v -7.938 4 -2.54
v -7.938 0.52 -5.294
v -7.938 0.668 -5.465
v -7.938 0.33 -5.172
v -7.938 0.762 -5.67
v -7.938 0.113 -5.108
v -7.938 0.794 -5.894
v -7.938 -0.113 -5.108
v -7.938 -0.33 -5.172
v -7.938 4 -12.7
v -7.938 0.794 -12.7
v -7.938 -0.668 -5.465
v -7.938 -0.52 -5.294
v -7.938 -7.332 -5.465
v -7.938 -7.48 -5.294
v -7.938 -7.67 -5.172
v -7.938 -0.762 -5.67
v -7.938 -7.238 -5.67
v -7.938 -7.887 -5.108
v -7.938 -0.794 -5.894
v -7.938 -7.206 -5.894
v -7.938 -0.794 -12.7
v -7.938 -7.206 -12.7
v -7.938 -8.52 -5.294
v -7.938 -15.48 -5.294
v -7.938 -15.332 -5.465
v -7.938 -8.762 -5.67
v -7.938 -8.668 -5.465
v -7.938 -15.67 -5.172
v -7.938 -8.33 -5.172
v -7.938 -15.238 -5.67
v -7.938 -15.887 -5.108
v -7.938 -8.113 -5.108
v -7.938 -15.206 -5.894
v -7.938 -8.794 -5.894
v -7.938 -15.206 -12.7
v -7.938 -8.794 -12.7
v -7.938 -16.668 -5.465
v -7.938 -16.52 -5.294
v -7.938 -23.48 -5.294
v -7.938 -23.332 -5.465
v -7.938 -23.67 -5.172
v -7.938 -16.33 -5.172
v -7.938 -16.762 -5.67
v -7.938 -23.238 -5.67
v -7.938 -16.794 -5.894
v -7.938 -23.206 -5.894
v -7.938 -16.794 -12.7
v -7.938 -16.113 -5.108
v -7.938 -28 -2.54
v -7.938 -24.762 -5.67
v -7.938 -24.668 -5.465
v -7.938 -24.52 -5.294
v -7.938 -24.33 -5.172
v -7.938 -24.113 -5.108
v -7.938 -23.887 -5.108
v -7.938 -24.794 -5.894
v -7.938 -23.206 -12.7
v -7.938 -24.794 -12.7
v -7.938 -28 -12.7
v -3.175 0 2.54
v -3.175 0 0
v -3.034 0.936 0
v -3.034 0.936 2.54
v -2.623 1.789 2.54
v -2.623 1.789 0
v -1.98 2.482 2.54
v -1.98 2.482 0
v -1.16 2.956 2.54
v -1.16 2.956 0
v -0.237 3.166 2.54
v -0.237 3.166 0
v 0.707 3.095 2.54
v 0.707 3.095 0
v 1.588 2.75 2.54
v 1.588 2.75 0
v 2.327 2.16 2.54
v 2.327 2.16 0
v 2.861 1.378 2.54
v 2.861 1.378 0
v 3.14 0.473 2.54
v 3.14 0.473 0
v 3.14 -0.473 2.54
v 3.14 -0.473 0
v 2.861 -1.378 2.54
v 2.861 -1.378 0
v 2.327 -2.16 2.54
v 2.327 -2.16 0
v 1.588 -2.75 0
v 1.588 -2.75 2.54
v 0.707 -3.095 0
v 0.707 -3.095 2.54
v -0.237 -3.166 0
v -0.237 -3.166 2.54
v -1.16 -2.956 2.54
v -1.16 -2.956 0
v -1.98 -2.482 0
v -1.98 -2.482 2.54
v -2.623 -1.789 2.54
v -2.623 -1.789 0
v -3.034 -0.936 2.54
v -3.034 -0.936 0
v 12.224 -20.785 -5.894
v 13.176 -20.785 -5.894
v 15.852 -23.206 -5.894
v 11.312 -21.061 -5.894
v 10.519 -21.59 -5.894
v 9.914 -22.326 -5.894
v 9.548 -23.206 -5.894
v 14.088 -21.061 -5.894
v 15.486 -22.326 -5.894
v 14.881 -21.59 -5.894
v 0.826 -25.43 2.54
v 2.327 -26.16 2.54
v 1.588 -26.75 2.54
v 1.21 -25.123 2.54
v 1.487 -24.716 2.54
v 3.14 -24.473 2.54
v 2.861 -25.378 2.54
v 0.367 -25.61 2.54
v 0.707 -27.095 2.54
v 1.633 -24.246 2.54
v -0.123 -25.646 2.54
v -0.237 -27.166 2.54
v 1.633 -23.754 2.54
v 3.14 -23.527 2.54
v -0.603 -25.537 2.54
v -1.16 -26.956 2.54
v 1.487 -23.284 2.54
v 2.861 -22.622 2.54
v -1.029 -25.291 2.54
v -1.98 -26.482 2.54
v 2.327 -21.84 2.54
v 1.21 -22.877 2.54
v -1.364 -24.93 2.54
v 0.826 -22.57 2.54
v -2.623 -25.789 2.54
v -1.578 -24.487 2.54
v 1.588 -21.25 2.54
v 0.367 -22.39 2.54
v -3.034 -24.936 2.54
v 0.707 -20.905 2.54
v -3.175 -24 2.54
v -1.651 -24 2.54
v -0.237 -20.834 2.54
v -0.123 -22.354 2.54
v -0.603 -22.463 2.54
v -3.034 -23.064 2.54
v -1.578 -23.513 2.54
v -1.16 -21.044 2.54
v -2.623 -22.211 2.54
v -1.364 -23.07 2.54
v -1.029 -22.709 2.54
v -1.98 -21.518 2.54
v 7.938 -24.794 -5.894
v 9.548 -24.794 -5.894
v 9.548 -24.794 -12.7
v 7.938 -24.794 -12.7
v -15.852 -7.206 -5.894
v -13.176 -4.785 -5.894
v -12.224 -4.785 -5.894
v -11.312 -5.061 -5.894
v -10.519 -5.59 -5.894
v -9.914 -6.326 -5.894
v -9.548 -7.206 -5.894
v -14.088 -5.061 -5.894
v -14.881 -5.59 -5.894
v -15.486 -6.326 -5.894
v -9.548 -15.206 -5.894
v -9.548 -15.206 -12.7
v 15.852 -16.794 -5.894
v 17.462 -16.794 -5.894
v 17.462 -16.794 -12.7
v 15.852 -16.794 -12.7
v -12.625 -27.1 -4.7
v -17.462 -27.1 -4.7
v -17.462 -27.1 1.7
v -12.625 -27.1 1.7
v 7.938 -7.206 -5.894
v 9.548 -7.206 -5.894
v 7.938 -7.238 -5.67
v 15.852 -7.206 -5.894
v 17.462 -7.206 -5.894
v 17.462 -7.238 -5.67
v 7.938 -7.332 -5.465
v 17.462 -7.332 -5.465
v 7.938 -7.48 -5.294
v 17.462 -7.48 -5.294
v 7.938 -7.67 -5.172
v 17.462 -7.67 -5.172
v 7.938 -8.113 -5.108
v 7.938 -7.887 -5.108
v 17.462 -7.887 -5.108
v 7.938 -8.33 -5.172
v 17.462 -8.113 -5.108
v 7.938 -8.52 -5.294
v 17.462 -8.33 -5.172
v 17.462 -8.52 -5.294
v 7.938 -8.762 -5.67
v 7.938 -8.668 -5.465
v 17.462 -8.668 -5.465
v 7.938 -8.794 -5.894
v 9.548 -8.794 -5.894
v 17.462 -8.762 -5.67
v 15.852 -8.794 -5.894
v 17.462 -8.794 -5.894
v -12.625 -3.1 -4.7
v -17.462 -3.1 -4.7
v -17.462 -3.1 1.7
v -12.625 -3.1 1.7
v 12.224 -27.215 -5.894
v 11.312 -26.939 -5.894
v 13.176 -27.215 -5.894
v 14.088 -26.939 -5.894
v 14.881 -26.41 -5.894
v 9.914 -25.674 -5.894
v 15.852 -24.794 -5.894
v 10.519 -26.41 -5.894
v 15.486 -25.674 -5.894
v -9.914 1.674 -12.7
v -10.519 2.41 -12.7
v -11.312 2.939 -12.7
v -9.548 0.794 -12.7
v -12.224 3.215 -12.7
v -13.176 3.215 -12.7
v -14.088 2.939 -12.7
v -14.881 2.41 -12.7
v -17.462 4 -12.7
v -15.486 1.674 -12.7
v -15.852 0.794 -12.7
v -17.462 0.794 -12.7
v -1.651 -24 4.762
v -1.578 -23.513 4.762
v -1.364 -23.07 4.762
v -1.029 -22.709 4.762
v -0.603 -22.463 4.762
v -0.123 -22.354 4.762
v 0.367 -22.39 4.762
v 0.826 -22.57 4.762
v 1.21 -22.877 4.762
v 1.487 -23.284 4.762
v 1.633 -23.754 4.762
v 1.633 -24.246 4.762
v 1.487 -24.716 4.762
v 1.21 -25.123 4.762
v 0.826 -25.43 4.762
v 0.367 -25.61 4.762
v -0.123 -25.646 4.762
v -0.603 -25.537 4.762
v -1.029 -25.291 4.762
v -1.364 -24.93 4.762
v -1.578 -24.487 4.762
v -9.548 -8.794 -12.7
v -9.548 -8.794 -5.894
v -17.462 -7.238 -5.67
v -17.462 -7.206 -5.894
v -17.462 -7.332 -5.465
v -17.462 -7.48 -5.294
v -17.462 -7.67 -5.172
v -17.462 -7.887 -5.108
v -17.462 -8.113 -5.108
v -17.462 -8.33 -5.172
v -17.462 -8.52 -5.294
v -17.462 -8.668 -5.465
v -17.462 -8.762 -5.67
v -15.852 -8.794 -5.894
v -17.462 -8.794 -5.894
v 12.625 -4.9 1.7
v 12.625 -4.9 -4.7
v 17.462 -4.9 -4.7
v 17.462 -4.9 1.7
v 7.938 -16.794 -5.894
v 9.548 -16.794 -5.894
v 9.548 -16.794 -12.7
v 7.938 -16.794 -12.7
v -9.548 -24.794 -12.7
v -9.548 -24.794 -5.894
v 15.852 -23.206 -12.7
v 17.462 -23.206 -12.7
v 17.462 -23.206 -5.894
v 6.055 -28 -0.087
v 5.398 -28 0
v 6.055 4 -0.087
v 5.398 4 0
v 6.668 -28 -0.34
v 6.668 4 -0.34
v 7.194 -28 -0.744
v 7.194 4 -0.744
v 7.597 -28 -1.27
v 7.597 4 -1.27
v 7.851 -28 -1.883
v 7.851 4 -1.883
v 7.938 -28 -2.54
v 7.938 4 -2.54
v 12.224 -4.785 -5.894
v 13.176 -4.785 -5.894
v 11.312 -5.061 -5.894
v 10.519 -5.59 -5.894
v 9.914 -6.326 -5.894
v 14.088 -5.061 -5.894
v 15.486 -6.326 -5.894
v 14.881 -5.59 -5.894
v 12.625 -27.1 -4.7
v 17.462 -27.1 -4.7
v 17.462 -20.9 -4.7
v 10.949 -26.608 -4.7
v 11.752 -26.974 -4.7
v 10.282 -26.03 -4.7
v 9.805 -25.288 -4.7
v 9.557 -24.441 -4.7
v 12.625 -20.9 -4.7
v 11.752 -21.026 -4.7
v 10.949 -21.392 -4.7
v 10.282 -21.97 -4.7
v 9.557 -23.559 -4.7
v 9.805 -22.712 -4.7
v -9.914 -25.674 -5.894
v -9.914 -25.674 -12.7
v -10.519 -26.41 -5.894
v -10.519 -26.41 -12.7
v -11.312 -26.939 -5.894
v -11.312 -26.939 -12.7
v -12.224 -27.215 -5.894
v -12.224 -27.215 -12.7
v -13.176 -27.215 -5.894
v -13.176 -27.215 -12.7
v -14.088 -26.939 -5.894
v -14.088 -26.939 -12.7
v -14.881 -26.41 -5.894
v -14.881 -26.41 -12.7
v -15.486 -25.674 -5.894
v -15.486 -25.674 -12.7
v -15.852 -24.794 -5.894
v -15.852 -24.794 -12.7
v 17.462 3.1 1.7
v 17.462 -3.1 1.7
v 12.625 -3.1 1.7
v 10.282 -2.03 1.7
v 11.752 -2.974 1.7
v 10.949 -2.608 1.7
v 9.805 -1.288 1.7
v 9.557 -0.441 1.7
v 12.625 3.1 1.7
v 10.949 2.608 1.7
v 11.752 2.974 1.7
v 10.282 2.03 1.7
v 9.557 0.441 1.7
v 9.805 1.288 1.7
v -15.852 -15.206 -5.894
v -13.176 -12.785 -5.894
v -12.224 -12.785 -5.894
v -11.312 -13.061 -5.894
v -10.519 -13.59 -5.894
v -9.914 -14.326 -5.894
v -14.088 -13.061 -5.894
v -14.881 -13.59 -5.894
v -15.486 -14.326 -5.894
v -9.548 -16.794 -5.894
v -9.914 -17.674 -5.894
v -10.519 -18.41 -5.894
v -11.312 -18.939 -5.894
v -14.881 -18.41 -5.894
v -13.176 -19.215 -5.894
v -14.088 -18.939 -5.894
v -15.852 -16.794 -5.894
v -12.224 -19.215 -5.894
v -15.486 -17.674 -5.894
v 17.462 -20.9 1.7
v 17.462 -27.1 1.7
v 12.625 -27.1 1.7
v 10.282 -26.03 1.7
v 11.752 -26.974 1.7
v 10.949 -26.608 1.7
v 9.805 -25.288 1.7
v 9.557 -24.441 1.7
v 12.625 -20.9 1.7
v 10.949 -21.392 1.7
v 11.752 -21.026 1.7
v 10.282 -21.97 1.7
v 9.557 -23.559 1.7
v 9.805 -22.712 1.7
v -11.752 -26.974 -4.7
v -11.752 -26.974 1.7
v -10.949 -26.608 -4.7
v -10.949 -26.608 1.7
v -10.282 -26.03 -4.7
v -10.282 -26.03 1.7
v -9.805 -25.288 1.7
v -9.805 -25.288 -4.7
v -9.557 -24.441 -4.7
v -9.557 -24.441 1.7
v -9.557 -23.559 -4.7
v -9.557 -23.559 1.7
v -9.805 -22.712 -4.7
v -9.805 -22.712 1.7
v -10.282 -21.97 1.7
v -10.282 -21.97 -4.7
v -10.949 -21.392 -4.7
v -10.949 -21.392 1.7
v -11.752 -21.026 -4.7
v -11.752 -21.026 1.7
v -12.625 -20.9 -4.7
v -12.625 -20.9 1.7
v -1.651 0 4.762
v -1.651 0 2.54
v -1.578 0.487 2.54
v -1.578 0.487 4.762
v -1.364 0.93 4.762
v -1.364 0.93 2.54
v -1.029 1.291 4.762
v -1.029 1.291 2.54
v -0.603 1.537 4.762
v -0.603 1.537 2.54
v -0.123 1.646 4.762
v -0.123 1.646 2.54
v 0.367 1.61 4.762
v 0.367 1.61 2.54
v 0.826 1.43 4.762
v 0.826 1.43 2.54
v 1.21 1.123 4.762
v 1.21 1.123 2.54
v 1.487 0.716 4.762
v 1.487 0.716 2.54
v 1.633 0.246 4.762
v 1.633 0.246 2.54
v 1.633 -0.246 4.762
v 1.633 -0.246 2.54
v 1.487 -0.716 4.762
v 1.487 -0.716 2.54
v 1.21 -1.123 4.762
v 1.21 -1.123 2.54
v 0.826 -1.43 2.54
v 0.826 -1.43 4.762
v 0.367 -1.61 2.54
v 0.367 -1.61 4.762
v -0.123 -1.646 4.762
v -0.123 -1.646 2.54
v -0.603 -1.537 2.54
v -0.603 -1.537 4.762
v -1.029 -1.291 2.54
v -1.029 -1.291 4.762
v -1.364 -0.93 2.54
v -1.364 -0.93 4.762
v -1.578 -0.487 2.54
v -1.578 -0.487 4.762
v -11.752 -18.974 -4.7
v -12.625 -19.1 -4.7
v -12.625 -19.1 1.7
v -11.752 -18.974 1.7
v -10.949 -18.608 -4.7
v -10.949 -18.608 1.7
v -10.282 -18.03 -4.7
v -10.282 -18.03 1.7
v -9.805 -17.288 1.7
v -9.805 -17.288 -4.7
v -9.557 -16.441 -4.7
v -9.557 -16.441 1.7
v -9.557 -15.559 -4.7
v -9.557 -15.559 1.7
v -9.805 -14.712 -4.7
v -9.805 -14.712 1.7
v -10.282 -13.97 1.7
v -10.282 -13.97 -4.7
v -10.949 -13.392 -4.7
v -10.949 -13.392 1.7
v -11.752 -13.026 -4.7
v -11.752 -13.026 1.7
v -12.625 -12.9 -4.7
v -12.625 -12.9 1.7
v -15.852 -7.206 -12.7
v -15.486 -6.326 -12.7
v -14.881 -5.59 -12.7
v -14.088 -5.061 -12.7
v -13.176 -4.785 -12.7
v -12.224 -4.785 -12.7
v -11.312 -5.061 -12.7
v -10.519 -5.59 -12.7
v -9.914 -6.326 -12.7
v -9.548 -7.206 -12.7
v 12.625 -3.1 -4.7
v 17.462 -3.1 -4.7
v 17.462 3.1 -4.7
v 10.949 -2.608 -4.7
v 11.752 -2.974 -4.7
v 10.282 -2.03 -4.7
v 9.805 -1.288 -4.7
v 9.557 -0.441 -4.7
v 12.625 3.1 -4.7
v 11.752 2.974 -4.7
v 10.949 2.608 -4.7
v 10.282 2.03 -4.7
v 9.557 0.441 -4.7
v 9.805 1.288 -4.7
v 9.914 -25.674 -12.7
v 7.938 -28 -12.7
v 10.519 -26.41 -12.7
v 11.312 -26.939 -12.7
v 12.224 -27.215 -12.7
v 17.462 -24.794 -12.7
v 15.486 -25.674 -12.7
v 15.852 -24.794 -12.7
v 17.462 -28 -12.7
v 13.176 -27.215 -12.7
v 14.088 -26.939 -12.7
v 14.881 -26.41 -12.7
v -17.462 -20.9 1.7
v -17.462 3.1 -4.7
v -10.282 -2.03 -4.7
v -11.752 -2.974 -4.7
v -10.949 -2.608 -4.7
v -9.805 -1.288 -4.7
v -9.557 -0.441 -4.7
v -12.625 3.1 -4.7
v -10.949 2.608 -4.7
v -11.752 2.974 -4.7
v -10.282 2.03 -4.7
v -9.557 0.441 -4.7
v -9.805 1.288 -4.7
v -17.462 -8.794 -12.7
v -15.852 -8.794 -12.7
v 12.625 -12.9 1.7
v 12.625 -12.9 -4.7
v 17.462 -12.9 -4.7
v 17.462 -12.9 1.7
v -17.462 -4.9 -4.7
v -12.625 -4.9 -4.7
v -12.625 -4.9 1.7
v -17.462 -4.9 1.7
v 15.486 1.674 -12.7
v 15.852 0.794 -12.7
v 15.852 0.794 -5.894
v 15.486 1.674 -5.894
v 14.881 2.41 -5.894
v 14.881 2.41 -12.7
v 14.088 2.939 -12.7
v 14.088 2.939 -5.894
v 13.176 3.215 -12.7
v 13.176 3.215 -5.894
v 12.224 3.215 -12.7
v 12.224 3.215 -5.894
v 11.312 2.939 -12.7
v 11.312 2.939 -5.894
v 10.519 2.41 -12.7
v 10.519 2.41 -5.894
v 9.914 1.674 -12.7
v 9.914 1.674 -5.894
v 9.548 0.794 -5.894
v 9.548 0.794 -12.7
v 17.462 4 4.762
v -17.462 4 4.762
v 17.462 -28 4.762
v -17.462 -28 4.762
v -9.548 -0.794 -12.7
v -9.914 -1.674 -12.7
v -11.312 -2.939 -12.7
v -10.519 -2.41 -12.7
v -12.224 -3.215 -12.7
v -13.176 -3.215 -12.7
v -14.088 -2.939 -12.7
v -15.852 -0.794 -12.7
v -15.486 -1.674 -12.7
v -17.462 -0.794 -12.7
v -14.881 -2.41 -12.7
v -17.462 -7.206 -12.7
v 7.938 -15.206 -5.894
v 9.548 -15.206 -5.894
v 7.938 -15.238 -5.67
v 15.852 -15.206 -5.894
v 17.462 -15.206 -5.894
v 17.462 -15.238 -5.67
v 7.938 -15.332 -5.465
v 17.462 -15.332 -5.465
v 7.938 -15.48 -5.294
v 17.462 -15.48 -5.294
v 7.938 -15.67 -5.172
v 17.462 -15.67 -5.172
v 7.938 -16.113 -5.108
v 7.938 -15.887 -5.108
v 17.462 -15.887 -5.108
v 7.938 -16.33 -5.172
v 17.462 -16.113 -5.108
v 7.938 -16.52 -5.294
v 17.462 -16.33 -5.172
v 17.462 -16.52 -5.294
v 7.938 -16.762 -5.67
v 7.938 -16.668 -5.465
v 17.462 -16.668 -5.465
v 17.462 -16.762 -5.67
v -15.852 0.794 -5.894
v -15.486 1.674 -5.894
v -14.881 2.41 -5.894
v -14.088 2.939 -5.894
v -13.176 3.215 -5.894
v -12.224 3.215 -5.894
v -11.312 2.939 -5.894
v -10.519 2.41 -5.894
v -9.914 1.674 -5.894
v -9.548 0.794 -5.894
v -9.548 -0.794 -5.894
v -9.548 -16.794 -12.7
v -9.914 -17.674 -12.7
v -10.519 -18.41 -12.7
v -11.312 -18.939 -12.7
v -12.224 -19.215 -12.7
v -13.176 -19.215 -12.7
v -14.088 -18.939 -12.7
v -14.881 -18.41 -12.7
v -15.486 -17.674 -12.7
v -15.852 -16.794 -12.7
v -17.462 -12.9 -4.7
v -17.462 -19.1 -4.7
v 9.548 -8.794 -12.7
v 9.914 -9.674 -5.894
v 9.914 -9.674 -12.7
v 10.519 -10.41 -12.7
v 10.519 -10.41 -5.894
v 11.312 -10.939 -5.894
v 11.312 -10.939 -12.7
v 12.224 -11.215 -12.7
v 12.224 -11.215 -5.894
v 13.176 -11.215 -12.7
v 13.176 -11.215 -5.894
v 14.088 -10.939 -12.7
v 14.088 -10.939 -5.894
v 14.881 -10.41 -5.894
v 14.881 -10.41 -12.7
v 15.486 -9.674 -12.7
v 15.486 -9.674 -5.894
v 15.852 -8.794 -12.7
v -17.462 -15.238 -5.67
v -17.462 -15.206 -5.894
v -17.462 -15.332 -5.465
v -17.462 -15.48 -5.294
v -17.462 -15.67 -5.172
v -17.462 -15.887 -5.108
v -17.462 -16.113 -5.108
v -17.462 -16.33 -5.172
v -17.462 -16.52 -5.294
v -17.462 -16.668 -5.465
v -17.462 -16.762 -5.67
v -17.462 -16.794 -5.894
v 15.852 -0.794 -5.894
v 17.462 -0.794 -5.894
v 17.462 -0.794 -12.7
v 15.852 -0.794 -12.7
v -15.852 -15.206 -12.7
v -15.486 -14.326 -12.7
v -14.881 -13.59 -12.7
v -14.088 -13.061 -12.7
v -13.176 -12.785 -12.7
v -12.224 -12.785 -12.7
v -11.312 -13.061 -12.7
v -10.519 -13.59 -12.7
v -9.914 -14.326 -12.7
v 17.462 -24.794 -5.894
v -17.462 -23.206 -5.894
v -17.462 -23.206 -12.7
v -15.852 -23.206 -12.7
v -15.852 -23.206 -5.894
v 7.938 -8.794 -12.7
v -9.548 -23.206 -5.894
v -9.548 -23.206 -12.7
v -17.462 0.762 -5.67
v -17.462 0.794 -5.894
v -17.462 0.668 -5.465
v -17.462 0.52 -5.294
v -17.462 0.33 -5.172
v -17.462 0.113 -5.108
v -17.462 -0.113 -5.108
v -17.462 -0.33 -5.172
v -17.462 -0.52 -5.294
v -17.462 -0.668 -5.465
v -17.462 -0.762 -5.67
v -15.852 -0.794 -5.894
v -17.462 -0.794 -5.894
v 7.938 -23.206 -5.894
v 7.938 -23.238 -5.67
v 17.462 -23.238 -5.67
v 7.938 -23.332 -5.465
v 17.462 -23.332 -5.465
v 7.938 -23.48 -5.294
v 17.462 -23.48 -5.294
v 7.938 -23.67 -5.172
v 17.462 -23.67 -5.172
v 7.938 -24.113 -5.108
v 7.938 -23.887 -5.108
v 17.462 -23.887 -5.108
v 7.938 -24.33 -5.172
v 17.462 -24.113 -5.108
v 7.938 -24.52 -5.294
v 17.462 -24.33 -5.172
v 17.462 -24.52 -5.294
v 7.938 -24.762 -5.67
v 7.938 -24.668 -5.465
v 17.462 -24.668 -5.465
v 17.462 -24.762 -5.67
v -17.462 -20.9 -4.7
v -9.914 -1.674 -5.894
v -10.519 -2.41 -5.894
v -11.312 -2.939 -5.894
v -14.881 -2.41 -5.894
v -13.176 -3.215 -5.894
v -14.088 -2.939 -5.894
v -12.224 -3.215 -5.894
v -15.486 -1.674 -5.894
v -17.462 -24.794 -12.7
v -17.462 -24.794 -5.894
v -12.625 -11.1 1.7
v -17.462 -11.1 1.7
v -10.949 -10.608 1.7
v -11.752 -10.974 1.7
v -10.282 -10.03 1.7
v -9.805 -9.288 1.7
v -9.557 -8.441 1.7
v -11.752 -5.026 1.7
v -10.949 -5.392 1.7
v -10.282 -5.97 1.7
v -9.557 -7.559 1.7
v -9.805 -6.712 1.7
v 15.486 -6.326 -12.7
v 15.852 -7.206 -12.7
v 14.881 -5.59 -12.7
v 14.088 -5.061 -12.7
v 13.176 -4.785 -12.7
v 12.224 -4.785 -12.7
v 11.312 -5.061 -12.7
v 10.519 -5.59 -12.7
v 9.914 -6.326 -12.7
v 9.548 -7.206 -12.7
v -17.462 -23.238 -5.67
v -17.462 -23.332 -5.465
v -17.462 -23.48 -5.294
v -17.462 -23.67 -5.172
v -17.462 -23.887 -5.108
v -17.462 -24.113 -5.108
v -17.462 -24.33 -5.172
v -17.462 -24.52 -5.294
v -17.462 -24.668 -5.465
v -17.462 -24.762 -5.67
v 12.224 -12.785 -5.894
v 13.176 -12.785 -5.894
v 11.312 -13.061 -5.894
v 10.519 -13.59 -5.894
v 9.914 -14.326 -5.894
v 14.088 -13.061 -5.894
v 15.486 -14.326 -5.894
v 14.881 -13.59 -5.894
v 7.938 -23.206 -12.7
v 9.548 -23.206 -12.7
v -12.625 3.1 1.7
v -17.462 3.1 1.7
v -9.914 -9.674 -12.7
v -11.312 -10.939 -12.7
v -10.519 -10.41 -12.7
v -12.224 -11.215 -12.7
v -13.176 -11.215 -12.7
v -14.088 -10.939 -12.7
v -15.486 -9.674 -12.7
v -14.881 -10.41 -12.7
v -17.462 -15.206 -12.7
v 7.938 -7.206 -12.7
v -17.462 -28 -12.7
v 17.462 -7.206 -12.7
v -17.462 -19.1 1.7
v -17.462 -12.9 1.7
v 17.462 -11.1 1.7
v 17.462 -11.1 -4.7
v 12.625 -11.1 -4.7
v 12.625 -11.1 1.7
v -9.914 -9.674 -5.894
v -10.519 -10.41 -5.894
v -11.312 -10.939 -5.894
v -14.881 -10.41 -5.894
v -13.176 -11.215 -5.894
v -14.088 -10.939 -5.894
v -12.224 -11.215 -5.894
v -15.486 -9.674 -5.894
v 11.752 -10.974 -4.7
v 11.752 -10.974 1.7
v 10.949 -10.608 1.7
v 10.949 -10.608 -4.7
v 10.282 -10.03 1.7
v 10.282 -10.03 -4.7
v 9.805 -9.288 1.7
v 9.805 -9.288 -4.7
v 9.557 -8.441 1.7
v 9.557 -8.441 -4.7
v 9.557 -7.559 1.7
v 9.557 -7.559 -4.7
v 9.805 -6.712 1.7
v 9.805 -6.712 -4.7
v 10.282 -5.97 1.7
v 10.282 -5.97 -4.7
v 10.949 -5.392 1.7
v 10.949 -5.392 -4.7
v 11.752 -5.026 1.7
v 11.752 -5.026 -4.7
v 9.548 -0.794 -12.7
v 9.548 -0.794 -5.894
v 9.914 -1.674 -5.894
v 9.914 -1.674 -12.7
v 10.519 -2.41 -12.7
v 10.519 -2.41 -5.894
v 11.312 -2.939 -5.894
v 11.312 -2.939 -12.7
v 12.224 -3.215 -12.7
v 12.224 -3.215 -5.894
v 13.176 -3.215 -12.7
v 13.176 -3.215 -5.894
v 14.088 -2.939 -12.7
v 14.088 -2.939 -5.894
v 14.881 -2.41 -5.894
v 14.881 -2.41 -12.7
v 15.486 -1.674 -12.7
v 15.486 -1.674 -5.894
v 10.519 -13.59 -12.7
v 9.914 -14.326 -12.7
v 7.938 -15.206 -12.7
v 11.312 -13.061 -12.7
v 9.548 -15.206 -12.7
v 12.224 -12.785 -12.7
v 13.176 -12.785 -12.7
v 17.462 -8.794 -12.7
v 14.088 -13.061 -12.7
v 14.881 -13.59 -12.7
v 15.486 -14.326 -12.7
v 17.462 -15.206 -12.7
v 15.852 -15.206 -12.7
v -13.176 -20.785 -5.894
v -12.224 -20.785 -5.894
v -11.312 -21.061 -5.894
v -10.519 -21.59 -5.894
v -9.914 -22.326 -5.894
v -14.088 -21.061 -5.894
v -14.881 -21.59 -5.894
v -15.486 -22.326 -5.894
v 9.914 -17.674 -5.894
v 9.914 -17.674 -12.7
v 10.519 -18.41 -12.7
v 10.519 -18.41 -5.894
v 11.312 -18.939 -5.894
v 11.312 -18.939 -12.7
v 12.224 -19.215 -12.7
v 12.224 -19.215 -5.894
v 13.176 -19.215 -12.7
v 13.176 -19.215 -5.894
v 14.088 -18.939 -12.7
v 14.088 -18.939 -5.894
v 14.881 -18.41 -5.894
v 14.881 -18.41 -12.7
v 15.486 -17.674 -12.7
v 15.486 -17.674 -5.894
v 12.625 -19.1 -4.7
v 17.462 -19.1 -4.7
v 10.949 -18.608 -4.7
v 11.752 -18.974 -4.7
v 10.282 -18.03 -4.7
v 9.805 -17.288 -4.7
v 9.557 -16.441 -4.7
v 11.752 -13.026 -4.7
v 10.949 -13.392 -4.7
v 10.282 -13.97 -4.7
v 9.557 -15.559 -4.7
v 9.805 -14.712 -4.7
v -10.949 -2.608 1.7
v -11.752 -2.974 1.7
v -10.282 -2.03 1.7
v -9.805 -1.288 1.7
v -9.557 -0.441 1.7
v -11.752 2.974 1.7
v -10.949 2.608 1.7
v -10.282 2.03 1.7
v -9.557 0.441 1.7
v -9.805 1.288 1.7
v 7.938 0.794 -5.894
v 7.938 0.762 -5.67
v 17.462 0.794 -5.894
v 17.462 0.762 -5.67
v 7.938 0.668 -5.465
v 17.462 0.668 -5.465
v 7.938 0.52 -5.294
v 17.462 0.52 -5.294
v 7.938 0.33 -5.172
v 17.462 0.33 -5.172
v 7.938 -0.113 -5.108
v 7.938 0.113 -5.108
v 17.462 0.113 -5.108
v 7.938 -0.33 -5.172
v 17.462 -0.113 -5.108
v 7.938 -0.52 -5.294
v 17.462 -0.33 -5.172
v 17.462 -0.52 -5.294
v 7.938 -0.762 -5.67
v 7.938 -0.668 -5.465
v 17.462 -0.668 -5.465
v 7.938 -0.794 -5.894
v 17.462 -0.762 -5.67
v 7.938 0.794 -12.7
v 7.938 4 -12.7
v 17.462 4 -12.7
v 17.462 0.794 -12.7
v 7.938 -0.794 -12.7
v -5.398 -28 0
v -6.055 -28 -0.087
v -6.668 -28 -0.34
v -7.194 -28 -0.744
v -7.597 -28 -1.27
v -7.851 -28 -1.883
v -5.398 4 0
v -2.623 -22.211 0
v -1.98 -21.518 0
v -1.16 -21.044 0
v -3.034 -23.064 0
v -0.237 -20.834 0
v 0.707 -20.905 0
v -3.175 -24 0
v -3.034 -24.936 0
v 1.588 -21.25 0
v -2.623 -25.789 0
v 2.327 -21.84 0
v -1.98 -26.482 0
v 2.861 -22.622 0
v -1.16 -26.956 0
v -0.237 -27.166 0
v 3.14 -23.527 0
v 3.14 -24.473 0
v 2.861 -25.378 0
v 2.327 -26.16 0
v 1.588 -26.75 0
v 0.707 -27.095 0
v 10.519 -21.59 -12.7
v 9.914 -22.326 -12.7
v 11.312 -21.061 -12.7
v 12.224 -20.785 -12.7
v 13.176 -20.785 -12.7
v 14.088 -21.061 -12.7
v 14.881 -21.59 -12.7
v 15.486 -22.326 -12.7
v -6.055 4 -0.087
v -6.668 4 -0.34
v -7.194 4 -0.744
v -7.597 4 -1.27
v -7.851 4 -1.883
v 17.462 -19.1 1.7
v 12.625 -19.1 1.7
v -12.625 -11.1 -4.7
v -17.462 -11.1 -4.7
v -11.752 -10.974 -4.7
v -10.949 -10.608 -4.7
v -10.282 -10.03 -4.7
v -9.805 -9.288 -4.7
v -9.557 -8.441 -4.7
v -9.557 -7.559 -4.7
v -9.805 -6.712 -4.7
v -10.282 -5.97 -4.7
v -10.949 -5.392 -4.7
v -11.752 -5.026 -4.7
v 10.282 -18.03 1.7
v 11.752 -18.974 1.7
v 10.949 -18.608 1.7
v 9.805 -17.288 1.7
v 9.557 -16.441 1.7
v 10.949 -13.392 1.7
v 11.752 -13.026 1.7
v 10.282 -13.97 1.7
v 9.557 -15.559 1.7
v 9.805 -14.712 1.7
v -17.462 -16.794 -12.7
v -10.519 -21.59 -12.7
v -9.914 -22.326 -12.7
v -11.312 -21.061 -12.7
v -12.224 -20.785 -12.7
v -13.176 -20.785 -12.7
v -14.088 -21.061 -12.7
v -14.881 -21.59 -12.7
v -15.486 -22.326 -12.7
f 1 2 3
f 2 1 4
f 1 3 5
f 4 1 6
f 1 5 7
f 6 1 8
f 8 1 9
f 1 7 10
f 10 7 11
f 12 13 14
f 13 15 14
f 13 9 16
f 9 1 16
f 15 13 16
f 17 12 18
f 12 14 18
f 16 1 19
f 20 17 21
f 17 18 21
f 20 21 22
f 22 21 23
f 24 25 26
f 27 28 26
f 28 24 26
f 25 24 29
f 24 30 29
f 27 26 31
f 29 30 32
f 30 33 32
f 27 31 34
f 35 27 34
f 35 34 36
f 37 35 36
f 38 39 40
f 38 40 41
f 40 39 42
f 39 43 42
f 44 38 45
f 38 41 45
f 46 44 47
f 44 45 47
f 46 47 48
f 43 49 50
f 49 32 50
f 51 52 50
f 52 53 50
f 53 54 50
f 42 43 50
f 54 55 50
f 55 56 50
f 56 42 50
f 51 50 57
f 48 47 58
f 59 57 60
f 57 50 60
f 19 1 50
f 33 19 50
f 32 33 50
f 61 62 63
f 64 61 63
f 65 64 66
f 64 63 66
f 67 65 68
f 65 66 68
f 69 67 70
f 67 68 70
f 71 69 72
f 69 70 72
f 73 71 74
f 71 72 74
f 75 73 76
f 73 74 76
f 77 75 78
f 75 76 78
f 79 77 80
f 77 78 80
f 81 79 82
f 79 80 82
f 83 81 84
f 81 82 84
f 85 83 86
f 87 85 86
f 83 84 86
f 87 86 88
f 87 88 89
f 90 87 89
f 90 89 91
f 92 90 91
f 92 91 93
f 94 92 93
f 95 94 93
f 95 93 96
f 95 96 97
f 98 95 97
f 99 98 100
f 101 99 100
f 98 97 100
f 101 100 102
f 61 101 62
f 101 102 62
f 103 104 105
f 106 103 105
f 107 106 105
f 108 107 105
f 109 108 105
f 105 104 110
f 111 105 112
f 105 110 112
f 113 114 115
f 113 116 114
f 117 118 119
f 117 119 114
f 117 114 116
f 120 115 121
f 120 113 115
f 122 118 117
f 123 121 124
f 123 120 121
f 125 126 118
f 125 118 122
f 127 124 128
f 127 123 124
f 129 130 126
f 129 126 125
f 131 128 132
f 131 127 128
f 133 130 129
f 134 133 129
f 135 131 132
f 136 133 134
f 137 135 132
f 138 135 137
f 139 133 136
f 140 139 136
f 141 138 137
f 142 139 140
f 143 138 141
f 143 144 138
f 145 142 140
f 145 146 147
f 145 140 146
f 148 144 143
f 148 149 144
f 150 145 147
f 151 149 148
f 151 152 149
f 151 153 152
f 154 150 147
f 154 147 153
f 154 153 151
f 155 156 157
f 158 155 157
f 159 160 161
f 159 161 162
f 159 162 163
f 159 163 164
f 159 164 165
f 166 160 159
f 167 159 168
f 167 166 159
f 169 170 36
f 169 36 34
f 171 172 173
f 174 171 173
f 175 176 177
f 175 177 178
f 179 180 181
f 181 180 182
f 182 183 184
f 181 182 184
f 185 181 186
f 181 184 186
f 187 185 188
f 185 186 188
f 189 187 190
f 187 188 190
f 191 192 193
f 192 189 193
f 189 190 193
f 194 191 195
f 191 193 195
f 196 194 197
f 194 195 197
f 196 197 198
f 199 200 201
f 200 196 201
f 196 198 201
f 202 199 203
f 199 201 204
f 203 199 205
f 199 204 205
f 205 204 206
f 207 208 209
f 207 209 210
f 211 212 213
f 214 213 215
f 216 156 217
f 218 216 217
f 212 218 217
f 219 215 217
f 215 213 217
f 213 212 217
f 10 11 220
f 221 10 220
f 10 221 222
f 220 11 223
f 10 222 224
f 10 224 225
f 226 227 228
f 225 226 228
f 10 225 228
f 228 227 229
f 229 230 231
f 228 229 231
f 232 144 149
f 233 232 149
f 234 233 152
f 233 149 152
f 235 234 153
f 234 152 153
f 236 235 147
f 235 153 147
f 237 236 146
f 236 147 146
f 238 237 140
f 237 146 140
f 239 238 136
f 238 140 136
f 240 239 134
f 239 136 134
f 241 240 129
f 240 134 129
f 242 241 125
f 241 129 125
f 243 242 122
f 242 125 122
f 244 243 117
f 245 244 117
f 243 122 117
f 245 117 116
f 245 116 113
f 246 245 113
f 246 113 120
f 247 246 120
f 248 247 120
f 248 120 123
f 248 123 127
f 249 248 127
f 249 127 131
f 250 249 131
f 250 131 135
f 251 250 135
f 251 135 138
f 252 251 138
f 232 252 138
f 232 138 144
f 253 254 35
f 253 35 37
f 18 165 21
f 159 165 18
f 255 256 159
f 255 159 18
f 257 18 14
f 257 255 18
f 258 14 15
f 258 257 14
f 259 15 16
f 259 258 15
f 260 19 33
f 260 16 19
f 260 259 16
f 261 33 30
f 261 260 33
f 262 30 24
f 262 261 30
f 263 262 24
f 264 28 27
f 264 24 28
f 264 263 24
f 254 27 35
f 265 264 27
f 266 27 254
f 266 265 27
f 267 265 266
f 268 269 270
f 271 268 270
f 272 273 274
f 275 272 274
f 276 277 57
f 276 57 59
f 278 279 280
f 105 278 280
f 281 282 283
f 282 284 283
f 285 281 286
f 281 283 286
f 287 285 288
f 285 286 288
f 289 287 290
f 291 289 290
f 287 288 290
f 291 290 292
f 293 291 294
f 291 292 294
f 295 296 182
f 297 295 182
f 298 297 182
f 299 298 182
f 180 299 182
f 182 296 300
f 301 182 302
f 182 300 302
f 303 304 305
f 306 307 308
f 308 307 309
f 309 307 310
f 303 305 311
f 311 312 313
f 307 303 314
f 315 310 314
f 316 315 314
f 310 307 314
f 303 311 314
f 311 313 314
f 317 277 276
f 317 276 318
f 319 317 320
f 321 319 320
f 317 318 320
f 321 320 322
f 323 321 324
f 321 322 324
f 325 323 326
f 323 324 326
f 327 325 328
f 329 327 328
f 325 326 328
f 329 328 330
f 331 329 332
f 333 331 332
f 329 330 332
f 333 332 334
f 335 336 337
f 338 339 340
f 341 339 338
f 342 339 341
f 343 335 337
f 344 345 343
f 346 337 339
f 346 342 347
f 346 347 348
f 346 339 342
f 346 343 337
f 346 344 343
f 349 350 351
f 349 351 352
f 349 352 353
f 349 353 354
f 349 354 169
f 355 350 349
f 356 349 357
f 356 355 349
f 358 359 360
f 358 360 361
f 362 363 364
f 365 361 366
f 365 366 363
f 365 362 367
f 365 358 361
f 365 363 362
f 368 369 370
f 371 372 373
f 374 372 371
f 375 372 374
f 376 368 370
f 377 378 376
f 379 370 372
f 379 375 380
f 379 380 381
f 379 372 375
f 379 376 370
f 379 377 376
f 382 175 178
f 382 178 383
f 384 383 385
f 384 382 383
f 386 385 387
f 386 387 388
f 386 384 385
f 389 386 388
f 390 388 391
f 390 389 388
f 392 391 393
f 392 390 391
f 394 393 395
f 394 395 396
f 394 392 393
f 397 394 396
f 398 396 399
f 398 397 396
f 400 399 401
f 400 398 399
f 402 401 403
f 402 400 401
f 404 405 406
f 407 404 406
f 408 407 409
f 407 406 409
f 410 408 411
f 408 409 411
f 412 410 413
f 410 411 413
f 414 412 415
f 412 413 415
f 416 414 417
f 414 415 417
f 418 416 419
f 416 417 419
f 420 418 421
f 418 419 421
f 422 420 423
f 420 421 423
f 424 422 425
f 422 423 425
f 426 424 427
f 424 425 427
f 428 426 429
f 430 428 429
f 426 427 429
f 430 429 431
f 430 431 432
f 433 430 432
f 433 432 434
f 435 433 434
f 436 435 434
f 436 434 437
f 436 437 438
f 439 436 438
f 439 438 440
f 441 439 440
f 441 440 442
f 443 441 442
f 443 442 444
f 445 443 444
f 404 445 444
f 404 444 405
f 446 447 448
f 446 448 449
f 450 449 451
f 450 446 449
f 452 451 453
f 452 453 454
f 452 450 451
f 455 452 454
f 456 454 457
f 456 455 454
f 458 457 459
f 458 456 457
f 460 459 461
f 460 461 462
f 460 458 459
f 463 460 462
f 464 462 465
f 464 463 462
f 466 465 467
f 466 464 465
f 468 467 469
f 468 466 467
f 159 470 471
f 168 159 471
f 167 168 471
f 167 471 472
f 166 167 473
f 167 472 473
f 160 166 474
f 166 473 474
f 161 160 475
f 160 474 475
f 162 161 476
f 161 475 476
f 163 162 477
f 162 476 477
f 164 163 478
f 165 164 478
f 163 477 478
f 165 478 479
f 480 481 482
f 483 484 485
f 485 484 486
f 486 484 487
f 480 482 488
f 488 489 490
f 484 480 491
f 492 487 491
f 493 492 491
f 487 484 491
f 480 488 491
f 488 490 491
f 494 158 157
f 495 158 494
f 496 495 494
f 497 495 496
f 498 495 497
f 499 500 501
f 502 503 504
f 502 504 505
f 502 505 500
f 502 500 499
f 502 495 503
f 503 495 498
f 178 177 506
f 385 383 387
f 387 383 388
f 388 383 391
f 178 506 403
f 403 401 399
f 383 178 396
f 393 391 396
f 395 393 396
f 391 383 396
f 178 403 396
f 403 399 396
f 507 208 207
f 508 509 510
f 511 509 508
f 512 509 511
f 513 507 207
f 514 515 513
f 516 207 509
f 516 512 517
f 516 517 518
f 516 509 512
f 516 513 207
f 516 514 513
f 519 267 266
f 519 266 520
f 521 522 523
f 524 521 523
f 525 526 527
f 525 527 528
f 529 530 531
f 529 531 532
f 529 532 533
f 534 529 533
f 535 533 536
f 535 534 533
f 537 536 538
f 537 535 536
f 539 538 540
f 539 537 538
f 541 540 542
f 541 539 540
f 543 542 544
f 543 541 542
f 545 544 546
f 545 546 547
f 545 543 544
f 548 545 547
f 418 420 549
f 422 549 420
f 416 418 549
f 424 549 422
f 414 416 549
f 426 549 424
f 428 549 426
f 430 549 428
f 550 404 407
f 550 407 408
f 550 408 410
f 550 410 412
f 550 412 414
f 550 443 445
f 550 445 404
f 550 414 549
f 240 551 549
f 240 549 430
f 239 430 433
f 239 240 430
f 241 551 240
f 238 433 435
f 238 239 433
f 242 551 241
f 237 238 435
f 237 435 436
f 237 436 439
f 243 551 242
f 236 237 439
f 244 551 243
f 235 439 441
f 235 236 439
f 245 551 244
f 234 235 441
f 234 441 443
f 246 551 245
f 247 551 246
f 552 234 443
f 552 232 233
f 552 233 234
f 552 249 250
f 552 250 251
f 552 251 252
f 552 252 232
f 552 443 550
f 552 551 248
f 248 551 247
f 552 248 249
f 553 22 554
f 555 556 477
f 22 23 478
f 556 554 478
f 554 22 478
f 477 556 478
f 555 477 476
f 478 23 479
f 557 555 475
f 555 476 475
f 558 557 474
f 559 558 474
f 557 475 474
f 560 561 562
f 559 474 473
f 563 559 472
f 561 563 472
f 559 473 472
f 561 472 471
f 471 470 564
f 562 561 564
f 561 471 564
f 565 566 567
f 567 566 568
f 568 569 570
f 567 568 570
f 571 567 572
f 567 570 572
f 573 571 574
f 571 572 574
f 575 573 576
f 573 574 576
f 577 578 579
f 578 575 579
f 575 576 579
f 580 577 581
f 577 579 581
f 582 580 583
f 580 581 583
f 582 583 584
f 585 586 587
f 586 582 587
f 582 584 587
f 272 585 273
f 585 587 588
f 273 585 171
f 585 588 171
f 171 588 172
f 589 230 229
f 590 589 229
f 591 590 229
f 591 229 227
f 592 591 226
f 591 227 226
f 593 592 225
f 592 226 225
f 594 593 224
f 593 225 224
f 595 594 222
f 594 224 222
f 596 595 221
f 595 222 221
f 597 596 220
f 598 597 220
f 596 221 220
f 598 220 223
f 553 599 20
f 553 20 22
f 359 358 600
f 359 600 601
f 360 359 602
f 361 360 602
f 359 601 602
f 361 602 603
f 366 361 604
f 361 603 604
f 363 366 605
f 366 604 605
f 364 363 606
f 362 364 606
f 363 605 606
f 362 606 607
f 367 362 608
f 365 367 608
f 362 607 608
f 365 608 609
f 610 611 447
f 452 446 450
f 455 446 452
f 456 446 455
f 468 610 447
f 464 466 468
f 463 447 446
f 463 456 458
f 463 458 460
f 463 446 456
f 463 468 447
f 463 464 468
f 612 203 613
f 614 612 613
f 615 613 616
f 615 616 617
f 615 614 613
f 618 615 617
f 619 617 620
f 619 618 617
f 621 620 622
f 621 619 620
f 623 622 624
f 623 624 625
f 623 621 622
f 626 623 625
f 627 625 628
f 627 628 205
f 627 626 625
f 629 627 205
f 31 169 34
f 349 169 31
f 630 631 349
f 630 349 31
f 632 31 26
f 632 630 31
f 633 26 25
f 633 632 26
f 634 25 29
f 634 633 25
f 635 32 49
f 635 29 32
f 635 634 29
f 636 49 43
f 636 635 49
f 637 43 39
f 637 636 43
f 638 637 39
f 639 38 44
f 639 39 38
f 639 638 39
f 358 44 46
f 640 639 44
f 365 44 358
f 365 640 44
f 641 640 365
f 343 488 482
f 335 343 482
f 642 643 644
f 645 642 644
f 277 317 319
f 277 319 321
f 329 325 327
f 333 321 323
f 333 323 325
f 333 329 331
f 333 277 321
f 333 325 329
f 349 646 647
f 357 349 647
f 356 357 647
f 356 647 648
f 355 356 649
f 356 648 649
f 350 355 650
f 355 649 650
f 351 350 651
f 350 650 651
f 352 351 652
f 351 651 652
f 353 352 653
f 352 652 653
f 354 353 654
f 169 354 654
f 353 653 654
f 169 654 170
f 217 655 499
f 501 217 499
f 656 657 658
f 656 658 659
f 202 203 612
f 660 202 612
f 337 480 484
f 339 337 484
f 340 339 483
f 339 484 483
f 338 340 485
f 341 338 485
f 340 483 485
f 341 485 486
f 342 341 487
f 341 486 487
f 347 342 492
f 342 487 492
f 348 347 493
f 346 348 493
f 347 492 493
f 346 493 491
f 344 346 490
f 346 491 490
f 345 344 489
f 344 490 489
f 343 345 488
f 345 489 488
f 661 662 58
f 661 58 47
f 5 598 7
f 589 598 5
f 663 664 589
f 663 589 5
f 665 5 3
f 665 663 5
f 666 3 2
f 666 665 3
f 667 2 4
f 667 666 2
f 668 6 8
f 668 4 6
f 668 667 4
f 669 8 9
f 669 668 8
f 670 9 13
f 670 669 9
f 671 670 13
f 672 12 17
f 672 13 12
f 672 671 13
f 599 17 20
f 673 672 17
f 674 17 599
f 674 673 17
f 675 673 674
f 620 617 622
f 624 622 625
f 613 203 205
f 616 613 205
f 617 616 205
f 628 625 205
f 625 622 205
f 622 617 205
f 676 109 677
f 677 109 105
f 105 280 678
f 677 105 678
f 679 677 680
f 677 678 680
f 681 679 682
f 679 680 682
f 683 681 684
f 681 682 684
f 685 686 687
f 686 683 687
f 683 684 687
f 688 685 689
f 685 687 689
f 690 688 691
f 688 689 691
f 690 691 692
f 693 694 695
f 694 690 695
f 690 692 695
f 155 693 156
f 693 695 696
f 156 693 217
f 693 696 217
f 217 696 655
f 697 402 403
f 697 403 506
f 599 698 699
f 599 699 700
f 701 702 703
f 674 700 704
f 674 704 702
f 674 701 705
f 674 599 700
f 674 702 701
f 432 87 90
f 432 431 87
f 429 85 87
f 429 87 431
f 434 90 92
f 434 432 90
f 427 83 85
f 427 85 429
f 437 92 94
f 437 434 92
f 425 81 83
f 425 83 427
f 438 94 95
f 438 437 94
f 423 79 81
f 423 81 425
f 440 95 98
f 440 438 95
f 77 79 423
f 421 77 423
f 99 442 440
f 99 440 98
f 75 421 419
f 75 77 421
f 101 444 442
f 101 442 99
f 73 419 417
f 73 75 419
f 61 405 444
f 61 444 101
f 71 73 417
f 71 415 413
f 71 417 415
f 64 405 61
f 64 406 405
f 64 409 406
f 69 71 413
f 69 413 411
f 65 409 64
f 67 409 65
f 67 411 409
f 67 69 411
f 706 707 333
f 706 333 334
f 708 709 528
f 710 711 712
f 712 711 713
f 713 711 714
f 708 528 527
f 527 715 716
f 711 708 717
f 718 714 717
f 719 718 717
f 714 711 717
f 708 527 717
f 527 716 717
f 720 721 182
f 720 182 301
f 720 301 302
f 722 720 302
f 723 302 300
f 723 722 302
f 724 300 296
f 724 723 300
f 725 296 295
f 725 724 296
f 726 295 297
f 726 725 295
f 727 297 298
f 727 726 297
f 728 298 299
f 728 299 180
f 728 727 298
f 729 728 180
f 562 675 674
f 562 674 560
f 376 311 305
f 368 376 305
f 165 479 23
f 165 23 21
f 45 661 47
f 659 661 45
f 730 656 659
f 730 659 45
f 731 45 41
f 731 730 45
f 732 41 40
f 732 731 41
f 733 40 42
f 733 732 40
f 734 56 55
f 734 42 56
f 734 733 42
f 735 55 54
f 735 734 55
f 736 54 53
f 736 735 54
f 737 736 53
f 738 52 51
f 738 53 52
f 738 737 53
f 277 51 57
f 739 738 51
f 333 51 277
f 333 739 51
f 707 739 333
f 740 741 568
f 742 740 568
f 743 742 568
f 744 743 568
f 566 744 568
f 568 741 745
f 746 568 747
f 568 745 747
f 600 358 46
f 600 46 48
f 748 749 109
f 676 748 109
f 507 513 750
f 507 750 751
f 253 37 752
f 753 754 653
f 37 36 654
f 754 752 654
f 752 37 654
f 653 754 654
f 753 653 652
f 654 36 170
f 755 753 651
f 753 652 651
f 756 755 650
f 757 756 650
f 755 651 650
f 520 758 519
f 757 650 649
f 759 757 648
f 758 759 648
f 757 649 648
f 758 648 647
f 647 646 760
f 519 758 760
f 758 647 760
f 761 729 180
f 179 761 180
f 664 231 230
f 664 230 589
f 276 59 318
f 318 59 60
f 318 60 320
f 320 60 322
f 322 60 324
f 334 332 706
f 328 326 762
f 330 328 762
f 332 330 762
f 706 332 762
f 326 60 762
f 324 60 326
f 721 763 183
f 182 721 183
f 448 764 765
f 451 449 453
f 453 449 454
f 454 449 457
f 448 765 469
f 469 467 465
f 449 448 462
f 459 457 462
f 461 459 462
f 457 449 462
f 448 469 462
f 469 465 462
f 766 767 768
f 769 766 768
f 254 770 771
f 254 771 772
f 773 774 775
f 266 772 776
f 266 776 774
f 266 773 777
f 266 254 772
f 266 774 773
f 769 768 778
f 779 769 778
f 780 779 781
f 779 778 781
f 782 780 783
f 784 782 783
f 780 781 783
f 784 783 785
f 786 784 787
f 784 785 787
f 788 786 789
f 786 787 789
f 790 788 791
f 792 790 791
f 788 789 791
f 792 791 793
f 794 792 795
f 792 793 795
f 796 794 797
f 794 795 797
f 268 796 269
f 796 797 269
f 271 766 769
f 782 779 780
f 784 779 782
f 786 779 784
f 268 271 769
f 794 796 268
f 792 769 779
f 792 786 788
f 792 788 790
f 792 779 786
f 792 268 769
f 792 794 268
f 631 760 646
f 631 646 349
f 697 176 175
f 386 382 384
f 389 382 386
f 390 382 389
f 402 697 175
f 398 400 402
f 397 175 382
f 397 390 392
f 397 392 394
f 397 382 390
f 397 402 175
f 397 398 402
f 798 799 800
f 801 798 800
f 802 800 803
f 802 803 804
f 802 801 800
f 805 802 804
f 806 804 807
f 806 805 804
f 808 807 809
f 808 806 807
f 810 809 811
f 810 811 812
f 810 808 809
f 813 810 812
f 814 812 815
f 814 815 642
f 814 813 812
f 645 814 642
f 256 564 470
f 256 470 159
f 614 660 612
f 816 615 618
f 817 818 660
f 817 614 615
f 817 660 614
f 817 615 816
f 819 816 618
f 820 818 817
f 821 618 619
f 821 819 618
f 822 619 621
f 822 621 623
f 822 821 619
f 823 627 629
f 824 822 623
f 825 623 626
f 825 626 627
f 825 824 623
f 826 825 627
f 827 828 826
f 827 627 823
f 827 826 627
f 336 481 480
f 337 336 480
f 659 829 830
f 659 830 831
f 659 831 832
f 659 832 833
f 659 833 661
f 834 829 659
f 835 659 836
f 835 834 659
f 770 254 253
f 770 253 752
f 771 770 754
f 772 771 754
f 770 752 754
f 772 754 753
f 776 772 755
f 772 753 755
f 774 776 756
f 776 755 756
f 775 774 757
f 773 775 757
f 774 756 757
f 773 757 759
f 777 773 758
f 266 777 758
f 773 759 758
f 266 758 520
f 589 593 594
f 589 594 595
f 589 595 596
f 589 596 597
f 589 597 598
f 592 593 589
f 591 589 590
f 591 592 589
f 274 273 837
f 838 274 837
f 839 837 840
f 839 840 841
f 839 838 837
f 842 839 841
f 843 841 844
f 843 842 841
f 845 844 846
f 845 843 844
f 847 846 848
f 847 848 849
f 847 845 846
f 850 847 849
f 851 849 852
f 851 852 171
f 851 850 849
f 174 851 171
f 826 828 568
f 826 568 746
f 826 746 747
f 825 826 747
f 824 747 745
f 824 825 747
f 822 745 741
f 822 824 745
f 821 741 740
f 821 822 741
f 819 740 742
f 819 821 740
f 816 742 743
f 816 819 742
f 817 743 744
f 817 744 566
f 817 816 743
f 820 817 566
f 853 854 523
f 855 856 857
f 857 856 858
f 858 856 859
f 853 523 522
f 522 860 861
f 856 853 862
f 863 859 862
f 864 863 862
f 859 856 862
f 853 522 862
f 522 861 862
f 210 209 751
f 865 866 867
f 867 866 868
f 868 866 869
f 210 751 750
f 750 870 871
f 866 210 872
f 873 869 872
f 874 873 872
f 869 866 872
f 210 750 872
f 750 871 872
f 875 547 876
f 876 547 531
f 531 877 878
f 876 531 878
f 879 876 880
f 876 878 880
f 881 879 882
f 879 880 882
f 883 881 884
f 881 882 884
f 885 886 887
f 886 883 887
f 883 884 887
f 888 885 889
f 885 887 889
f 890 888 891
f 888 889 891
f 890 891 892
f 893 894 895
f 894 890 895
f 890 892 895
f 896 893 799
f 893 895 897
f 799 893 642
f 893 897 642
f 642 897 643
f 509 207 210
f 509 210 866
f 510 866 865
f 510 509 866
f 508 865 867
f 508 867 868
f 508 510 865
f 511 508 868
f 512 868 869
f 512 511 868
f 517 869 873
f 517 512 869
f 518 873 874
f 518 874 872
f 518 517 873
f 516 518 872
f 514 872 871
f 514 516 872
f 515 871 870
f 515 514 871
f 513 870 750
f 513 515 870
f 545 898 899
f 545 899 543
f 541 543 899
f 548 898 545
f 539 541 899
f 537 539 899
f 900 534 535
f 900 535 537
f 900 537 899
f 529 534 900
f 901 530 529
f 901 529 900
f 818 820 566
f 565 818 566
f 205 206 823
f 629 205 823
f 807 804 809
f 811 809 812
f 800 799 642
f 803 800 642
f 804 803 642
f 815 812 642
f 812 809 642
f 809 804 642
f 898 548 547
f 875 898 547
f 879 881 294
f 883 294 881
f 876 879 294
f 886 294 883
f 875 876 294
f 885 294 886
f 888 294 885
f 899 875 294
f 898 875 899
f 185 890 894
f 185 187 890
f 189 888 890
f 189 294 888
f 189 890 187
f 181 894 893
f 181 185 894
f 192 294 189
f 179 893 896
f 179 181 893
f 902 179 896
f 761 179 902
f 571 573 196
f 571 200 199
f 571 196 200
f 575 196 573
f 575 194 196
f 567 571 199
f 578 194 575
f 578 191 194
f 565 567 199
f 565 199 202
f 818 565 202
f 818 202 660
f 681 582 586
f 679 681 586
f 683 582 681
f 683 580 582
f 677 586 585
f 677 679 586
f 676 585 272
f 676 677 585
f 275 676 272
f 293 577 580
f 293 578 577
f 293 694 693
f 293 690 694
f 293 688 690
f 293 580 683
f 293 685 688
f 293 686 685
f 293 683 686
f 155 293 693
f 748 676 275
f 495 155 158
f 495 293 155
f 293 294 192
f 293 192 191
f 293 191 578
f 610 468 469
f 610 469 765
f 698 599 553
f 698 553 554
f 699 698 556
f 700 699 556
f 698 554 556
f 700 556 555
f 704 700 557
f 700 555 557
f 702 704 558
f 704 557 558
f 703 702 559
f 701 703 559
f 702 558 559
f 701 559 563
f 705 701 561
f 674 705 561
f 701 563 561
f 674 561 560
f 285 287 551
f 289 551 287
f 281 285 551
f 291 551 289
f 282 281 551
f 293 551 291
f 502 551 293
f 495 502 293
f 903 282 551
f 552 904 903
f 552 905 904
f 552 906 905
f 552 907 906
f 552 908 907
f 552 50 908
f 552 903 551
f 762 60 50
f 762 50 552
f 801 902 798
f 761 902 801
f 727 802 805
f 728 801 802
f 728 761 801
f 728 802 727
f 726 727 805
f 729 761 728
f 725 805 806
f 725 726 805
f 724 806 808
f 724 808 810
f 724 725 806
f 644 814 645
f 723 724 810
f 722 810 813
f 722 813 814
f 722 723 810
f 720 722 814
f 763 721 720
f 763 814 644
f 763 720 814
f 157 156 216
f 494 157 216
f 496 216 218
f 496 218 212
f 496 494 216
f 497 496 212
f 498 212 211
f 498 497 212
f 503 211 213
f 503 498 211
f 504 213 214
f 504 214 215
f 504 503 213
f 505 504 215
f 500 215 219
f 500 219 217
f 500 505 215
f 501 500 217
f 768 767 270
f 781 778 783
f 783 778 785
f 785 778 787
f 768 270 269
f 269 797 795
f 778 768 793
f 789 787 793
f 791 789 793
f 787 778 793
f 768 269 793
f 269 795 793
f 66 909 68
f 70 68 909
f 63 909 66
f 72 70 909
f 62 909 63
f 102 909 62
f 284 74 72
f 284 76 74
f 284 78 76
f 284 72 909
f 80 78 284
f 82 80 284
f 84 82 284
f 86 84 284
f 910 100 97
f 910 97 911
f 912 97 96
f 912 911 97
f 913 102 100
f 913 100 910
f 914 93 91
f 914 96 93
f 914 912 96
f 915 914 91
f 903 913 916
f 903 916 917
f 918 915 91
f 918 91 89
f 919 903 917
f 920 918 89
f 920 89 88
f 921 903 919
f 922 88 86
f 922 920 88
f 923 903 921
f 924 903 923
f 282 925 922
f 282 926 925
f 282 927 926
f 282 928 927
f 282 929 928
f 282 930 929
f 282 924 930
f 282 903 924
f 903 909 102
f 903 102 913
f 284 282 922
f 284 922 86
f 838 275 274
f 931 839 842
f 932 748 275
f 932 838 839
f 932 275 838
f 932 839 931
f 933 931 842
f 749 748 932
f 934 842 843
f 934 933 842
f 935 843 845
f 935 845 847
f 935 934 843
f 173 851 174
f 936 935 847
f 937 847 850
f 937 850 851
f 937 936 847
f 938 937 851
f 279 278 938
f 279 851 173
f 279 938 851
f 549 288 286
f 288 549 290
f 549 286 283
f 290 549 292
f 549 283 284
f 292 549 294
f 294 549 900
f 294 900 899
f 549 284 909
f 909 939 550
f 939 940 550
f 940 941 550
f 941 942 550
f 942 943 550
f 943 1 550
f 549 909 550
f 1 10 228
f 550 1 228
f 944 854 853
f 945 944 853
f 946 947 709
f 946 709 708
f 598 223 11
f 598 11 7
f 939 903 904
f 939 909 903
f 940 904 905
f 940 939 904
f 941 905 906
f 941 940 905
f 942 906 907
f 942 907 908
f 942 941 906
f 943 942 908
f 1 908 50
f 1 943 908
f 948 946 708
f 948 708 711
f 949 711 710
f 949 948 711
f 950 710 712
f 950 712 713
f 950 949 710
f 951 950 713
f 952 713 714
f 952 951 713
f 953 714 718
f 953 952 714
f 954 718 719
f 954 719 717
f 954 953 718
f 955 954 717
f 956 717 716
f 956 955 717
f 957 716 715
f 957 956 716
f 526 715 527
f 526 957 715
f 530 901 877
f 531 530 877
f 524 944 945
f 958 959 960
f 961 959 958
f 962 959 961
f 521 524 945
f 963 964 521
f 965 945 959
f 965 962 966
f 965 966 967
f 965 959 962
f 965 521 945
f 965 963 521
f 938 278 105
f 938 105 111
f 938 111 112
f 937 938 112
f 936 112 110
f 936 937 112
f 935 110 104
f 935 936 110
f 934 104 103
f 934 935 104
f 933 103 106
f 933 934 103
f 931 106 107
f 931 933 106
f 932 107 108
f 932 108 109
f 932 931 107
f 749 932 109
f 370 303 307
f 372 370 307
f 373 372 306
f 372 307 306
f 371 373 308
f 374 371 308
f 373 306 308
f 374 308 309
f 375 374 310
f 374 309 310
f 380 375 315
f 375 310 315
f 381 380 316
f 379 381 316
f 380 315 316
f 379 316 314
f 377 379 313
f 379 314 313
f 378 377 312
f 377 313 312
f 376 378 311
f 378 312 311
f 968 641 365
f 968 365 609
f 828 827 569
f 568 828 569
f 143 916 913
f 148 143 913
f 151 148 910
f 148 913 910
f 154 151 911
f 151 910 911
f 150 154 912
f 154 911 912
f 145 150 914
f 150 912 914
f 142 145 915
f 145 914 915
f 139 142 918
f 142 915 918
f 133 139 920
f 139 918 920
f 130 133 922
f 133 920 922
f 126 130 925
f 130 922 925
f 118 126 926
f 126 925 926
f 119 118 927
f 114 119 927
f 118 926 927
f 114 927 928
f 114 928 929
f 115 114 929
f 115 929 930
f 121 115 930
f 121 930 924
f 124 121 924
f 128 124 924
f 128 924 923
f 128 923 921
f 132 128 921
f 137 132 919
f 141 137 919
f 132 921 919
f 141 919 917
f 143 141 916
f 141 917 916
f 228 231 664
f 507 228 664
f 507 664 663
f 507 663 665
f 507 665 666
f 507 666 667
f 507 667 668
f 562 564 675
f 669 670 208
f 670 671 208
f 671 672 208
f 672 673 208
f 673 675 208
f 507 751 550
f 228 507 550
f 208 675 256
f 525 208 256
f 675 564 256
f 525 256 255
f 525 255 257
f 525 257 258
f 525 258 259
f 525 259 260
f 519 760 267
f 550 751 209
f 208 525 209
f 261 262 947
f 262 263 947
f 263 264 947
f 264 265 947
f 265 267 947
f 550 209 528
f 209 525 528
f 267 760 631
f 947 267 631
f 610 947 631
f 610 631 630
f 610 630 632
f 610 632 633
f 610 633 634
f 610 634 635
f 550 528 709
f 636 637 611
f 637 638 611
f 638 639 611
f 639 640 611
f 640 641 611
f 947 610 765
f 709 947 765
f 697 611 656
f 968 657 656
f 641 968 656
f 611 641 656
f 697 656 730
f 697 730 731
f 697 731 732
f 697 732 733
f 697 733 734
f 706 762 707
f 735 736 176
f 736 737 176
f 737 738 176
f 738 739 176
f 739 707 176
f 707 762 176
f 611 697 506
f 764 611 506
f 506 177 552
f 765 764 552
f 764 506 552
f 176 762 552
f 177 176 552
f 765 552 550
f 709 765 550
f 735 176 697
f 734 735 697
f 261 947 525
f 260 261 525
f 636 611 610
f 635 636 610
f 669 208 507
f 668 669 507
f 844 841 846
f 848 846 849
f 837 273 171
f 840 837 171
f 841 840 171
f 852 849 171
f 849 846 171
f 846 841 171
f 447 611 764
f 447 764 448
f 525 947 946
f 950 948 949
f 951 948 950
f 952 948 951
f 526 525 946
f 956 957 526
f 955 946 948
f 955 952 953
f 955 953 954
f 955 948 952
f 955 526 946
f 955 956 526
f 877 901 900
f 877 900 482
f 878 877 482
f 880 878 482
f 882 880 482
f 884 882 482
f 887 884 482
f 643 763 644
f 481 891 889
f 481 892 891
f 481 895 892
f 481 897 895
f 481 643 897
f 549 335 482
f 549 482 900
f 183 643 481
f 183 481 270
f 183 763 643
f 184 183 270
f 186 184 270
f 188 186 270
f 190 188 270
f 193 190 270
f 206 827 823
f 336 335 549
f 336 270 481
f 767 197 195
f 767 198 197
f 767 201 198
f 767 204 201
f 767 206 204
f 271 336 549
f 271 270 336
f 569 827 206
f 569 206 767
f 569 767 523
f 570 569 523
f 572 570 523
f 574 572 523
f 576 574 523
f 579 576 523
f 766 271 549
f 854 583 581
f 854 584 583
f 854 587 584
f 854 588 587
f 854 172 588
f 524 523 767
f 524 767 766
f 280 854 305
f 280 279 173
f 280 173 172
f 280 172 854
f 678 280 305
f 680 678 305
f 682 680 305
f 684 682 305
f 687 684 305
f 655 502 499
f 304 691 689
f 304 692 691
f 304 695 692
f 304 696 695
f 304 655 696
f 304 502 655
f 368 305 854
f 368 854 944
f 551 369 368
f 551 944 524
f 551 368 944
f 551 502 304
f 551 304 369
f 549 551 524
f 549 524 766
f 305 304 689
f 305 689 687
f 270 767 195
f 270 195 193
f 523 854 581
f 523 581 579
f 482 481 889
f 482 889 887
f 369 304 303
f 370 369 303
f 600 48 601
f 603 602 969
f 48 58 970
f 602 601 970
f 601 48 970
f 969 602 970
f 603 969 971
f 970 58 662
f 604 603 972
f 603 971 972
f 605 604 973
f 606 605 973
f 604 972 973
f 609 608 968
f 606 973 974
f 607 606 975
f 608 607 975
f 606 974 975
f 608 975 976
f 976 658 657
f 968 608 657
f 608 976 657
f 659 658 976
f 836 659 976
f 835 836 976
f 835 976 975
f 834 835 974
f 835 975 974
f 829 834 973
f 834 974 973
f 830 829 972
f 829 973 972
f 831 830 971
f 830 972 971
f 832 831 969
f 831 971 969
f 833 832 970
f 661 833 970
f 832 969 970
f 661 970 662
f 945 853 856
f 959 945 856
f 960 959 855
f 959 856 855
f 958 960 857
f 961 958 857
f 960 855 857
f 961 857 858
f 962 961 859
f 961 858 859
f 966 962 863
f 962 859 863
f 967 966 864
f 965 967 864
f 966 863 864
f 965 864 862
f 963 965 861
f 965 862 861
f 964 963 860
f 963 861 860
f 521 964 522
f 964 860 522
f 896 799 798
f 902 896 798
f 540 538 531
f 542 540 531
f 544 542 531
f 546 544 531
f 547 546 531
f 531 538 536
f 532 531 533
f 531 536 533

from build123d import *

# Parameters (mm, degrees)
BOSS_EXTRUDE1_START = -4
BOSS_EXTRUDE1_DEPTH = 8
CUT_EXTRUDE1_START  = -8
CUT_EXTRUDE1_DEPTH  = 6.4
CUT_EXTRUDE2_DEPTH  = 22.959710978
FILLET1_R           = 2.54
SKETCH6_R           = 3.25
CUT_EXTRUDE5_DEPTH  = 6.80625
LPATTERN1_COUNT     = 4
LPATTERN1_PITCH     = 8
SKETCH4_R           = 1.651
CUT_EXTRUDE3_DEPTH  = 36.358576134
SKETCH5_R           = 3.175
CUT_EXTRUDE4_DEPTH  = 2.54


# Read off the part's stored shape, not the designer's step: Boss-Extrude1
with BuildPart() as part:
    # Boss-Extrude1 outline → Boss-Extrude1 (new body)
    with BuildSketch(Plane(origin=(0, 0, 0), x_dir=(1, 0, 0), z_dir=(0, 1, 0)).offset(BOSS_EXTRUDE1_START)):
        Polygon((0, -4.7625), (0, 0), (-7.9375, 0), (-7.9375, 12.7), (-17.4625, 12.7), (-17.4625, -4.7625), align=None)
    extrude(amount=BOSS_EXTRUDE1_DEPTH)

    # Sketch2 → Cut-Extrude1 (cut)
    with BuildSketch(Plane(origin=(0, 0, -12.7), x_dir=(-1, 0, 0), z_dir=(0, 0, -1)).offset(CUT_EXTRUDE1_START)):
        with BuildLine():
            Line((17.4625, -3.1), (12.625, -3.1))
            ThreePointArc((12.625, -3.1), (9.525, 0), (12.625, 3.1))
            Line((12.625, 3.1), (17.4625, 3.1))
            ThreePointArc((17.4625, 3.1), (20.5625, 0), (17.4625, -3.1))
        make_face()
    extrude(amount=-CUT_EXTRUDE1_DEPTH, mode=Mode.SUBTRACT)

    # Sketch3 → Cut-Extrude2 (cut, through all)
    with BuildSketch(Plane.ZY.offset(17.4625)):
        with BuildLine():
            Line((-12.7, 0.79375), (-5.89375, 0.79375))
            ThreePointArc((-5.89375, 0.79375), (-5.1, 0), (-5.89375, -0.79375))
            Line((-5.89375, -0.79375), (-12.7, -0.79375))
            ThreePointArc((-12.7, -0.79375), (-13.49375, 0), (-12.7, 0.79375))
        make_face()
    extrude(amount=-CUT_EXTRUDE2_DEPTH, mode=Mode.SUBTRACT)

    # Fillet1
    fillet1_edges = [part.edges().sort_by_distance(p)[0] for p in [
        (-7.9375, 0, 0),
    ]]
    fillet(fillet1_edges, radius=FILLET1_R)

    # Sketch6 → Cut-Extrude5 (cut)
    with BuildSketch(Plane(origin=(0, 0, -12.7), x_dir=(-1, 0, 0), z_dir=(0, 0, -1))):
        with Locations((12.7, 0)):
            Circle(SKETCH6_R)
    extrude(amount=-CUT_EXTRUDE5_DEPTH, mode=Mode.SUBTRACT)

    # Mirror1: part across plane


with BuildPart() as part_1:
    add(part.part)
    add(part.part.mirror(Plane(origin=(0, 4, 0), x_dir=(0, 0, 1), z_dir=(-1, 0, 0))))


with BuildPart() as lpattern1_1:
    # LPattern1: pattern copy
    add(part_1.part.moved(Location(Vector(0, -1, 0) * (1 * LPATTERN1_PITCH))))


with BuildPart() as lpattern1_2:
    # LPattern1: pattern copy
    add(part_1.part.moved(Location(Vector(0, -1, 0) * (2 * LPATTERN1_PITCH))))


with BuildPart() as lpattern1_3:
    # LPattern1: pattern copy
    add(part_1.part.moved(Location(Vector(0, -1, 0) * (3 * LPATTERN1_PITCH))))


with BuildPart() as part_2:
    add(part_1.part)

    # Combine1: union LPattern1_1, LPattern1_2, LPattern1_3
    add(lpattern1_1.part)
    add(lpattern1_2.part)
    add(lpattern1_3.part)

    # Sketch4 → Cut-Extrude3 (cut, through all)
    with BuildSketch(Plane(origin=(0, 0, 0), x_dir=(-1, 0, 0), z_dir=(0, 0, -1))):
        Circle(SKETCH4_R)
        with Locations((0, -24)):
            Circle(SKETCH4_R)
    extrude(amount=-CUT_EXTRUDE3_DEPTH, mode=Mode.SUBTRACT)

    # Sketch5 → Cut-Extrude4 (cut)
    with BuildSketch(Plane(origin=(0, 0, 0), x_dir=(-1, 0, 0), z_dir=(0, 0, -1))):
        Circle(SKETCH5_R)
        with Locations((0, -24)):
            Circle(SKETCH5_R)
    extrude(amount=-CUT_EXTRUDE4_DEPTH, mode=Mode.SUBTRACT)


solid = part_2.part
